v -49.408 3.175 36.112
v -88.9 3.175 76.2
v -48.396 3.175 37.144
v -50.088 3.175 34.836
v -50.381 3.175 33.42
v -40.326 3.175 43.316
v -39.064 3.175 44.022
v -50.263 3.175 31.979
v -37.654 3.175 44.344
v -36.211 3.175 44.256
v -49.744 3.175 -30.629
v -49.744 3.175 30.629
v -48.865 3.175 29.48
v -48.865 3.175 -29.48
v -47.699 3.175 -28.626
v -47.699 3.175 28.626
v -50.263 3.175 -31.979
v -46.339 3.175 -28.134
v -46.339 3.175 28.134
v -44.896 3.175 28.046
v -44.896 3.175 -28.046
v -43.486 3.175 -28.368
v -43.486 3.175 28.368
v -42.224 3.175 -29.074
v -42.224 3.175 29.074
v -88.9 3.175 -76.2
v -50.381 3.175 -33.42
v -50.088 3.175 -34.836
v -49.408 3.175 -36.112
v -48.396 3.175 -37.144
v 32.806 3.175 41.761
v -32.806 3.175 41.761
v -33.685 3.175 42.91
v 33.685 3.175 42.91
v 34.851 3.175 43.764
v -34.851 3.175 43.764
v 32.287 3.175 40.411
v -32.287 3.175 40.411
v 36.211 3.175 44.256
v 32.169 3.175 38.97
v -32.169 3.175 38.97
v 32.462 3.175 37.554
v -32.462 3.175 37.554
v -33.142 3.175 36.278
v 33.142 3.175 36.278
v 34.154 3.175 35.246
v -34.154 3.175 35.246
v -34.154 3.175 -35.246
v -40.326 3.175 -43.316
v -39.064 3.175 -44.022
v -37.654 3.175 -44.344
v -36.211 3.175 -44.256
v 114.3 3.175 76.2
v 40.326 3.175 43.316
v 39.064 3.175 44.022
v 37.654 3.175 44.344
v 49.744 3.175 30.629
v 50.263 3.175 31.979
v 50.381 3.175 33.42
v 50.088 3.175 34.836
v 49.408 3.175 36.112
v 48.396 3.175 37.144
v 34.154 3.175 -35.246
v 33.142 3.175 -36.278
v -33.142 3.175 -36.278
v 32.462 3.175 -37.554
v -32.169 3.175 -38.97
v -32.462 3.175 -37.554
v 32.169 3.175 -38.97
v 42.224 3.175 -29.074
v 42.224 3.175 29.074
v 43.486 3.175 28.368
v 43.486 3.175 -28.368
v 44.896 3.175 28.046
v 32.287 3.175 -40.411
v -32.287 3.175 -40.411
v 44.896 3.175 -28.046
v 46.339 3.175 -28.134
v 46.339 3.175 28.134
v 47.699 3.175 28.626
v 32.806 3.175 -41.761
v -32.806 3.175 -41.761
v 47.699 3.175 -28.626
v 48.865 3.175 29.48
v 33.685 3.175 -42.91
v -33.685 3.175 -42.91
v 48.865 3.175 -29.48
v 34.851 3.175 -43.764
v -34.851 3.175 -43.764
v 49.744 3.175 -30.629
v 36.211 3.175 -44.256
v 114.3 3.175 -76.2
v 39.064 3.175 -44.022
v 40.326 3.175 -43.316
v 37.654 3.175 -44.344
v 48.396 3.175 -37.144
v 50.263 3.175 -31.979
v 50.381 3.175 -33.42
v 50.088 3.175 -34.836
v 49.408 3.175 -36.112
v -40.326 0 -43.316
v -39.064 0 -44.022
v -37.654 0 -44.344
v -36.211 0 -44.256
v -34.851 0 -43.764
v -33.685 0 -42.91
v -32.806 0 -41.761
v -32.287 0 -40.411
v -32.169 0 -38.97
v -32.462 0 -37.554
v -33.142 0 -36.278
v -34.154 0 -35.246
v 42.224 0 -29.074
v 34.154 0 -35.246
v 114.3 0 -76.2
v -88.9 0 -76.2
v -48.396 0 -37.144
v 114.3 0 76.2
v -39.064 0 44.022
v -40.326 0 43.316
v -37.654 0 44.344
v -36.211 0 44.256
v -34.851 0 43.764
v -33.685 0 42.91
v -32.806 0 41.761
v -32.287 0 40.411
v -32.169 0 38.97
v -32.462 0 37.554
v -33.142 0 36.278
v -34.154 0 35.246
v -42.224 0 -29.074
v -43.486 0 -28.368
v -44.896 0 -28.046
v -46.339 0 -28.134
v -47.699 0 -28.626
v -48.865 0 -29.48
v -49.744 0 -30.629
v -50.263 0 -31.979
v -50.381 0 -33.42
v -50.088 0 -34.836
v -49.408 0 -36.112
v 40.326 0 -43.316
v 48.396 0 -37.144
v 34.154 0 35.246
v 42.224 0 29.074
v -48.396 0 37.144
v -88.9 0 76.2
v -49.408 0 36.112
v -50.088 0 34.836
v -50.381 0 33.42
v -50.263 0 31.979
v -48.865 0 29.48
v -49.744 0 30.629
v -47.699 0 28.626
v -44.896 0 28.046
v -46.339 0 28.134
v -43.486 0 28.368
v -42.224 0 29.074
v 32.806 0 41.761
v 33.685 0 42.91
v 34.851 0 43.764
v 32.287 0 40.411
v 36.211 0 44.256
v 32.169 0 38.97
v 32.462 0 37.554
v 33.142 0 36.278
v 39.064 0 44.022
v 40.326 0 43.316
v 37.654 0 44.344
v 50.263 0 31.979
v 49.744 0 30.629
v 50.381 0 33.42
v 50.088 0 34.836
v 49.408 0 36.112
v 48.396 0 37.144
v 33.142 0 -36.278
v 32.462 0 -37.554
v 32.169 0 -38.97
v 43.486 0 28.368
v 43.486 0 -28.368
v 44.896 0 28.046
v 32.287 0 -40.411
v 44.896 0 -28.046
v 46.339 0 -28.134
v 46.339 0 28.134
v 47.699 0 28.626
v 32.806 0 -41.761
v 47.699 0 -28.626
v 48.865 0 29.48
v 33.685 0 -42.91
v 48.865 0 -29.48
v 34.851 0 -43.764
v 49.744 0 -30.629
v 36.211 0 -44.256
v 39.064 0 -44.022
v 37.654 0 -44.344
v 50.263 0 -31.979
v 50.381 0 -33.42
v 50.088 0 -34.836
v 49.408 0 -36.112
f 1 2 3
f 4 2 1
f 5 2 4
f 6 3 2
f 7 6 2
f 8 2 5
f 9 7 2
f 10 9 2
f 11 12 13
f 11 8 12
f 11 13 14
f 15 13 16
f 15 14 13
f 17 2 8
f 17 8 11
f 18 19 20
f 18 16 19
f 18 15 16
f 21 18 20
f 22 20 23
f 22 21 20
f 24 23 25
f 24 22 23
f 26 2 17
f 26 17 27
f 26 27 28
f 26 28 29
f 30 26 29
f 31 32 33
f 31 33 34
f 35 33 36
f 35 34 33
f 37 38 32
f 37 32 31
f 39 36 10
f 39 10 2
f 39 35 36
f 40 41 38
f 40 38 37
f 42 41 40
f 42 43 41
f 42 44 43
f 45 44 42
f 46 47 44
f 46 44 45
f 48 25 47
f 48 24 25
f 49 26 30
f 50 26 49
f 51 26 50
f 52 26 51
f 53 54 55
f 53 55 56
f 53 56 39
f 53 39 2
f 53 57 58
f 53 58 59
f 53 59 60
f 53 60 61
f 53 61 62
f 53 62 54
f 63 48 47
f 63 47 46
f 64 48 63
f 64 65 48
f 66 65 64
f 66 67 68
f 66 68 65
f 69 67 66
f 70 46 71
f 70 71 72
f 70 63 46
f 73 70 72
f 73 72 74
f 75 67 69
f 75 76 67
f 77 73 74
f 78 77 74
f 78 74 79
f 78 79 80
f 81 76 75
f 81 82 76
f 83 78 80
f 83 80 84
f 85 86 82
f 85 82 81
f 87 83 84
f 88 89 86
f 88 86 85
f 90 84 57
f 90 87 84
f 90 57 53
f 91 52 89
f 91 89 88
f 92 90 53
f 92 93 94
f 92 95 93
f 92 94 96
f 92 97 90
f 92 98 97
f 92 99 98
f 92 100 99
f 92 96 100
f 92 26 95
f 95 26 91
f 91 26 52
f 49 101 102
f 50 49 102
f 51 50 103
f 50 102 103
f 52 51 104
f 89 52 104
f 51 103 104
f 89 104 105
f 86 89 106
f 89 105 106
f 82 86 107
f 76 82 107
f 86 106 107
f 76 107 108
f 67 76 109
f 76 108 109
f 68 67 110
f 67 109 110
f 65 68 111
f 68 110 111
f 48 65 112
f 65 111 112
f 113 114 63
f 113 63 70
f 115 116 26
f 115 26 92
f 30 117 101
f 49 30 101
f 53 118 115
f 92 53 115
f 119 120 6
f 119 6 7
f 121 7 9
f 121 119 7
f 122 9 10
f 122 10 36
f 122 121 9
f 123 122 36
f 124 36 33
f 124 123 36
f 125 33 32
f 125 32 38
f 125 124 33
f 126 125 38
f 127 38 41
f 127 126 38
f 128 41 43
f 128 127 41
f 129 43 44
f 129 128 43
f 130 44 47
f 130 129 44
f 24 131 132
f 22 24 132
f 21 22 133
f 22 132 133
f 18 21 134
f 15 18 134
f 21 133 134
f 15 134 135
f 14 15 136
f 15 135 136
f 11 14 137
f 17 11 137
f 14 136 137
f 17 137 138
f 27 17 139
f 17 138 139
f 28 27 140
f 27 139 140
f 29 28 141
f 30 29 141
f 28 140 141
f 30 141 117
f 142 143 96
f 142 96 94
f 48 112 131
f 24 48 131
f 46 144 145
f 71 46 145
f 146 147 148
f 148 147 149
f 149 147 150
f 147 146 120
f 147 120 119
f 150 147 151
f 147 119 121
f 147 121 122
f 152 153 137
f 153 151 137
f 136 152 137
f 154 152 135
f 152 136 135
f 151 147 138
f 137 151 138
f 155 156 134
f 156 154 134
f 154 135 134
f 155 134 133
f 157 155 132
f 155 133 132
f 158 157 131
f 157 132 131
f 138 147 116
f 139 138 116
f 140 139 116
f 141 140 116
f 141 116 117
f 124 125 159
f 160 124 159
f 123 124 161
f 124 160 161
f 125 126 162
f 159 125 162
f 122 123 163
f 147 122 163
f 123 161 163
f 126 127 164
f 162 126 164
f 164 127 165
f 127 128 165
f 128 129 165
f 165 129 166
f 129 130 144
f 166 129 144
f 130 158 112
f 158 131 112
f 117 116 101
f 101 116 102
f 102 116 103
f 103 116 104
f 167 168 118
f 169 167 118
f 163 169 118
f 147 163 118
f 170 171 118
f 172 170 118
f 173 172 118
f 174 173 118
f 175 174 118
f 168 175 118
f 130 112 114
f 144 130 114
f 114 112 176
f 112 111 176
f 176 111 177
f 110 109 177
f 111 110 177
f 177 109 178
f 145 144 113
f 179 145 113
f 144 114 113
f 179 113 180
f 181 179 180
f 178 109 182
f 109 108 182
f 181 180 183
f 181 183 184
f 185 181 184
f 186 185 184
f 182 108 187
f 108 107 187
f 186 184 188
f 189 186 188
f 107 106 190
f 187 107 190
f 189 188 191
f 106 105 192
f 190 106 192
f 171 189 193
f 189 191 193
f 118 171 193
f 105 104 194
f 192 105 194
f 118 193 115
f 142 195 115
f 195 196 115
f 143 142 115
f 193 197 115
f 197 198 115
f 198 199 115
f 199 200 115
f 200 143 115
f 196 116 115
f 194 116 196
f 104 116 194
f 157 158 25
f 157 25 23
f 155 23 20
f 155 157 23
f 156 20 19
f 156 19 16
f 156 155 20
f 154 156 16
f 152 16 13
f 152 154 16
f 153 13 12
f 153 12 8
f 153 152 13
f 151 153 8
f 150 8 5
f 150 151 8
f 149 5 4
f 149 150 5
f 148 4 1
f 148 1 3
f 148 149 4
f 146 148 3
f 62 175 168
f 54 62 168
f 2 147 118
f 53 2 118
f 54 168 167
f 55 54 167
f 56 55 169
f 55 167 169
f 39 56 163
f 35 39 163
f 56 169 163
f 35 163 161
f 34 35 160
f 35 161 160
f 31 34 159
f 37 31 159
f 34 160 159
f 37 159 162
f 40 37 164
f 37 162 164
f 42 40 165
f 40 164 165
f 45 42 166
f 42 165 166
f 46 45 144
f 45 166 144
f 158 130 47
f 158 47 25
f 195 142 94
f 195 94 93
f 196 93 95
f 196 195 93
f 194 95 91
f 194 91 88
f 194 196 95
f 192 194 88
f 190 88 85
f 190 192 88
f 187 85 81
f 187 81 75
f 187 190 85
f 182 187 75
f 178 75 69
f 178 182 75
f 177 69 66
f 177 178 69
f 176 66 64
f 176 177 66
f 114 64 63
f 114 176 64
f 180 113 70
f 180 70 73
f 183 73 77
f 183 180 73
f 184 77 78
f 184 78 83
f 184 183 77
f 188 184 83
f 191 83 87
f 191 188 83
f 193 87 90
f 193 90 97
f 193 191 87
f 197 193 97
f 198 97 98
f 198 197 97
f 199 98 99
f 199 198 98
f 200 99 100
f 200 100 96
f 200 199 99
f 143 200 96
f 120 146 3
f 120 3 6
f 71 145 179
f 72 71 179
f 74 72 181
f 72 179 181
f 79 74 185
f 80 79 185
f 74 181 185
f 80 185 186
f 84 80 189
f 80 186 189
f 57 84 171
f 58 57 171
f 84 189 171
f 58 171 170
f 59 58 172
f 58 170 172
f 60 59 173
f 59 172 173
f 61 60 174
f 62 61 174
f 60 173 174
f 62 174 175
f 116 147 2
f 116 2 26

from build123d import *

# Parameters (mm, degrees)
SKETCH1_W           = 203.2
SKETCH1_H           = 152.4
BOSS_EXTRUDE1_DEPTH = 3.175


with BuildPart() as part:
    # Sketch1 → Boss-Extrude1 (new body)
    with BuildSketch(Plane(origin=(0, 0, 0), x_dir=(1, 0, 0), z_dir=(0, 1, 0))):
        with Locations((12.7, 0)):
            Rectangle(SKETCH1_W, SKETCH1_H)
        with BuildLine():
            Line((-48.396184338, 37.144491245), (-40.325508755, 43.316184338))
            ThreePointArc((-40.325508755, 43.316184338), (-33.204324417, 42.366693093), (-34.153815662, 35.245508755))
            Line((-34.153815662, 35.245508755), (-42.224491245, 29.073815662))
            ThreePointArc((-42.224491245, 29.073815662), (-49.345675583, 30.023306907), (-48.396184338, 37.144491245))
        make_face(mode=Mode.SUBTRACT)
        with BuildLine():
            Line((34.153815662, 35.245508755), (42.224491245, 29.073815662))
            ThreePointArc((42.224491245, 29.073815662), (49.345675583, 30.023306907), (48.396184338, 37.144491245))
            Line((48.396184338, 37.144491245), (40.325508755, 43.316184338))
            ThreePointArc((40.325508755, 43.316184338), (33.204324417, 42.366693093), (34.153815662, 35.245508755))
        make_face(mode=Mode.SUBTRACT)
        with BuildLine():
            Line((34.153815662, -35.245508755), (42.224491245, -29.073815662))
            ThreePointArc((42.224491245, -29.073815662), (49.345675583, -30.023306907), (48.396184338, -37.144491245))
            Line((48.396184338, -37.144491245), (40.325508755, -43.316184338))
            ThreePointArc((40.325508755, -43.316184338), (33.204324417, -42.366693093), (34.153815662, -35.245508755))
        make_face(mode=Mode.SUBTRACT)
        with BuildLine():
            Line((-48.396184338, -37.144491245), (-40.325508755, -43.316184338))
            ThreePointArc((-40.325508755, -43.316184338), (-33.204324417, -42.366693093), (-34.153815662, -35.245508755))
            Line((-34.153815662, -35.245508755), (-42.224491245, -29.073815662))
            ThreePointArc((-42.224491245, -29.073815662), (-49.345675583, -30.023306907), (-48.396184338, -37.144491245))
        make_face(mode=Mode.SUBTRACT)
    extrude(amount=BOSS_EXTRUDE1_DEPTH)


solid = part.part
